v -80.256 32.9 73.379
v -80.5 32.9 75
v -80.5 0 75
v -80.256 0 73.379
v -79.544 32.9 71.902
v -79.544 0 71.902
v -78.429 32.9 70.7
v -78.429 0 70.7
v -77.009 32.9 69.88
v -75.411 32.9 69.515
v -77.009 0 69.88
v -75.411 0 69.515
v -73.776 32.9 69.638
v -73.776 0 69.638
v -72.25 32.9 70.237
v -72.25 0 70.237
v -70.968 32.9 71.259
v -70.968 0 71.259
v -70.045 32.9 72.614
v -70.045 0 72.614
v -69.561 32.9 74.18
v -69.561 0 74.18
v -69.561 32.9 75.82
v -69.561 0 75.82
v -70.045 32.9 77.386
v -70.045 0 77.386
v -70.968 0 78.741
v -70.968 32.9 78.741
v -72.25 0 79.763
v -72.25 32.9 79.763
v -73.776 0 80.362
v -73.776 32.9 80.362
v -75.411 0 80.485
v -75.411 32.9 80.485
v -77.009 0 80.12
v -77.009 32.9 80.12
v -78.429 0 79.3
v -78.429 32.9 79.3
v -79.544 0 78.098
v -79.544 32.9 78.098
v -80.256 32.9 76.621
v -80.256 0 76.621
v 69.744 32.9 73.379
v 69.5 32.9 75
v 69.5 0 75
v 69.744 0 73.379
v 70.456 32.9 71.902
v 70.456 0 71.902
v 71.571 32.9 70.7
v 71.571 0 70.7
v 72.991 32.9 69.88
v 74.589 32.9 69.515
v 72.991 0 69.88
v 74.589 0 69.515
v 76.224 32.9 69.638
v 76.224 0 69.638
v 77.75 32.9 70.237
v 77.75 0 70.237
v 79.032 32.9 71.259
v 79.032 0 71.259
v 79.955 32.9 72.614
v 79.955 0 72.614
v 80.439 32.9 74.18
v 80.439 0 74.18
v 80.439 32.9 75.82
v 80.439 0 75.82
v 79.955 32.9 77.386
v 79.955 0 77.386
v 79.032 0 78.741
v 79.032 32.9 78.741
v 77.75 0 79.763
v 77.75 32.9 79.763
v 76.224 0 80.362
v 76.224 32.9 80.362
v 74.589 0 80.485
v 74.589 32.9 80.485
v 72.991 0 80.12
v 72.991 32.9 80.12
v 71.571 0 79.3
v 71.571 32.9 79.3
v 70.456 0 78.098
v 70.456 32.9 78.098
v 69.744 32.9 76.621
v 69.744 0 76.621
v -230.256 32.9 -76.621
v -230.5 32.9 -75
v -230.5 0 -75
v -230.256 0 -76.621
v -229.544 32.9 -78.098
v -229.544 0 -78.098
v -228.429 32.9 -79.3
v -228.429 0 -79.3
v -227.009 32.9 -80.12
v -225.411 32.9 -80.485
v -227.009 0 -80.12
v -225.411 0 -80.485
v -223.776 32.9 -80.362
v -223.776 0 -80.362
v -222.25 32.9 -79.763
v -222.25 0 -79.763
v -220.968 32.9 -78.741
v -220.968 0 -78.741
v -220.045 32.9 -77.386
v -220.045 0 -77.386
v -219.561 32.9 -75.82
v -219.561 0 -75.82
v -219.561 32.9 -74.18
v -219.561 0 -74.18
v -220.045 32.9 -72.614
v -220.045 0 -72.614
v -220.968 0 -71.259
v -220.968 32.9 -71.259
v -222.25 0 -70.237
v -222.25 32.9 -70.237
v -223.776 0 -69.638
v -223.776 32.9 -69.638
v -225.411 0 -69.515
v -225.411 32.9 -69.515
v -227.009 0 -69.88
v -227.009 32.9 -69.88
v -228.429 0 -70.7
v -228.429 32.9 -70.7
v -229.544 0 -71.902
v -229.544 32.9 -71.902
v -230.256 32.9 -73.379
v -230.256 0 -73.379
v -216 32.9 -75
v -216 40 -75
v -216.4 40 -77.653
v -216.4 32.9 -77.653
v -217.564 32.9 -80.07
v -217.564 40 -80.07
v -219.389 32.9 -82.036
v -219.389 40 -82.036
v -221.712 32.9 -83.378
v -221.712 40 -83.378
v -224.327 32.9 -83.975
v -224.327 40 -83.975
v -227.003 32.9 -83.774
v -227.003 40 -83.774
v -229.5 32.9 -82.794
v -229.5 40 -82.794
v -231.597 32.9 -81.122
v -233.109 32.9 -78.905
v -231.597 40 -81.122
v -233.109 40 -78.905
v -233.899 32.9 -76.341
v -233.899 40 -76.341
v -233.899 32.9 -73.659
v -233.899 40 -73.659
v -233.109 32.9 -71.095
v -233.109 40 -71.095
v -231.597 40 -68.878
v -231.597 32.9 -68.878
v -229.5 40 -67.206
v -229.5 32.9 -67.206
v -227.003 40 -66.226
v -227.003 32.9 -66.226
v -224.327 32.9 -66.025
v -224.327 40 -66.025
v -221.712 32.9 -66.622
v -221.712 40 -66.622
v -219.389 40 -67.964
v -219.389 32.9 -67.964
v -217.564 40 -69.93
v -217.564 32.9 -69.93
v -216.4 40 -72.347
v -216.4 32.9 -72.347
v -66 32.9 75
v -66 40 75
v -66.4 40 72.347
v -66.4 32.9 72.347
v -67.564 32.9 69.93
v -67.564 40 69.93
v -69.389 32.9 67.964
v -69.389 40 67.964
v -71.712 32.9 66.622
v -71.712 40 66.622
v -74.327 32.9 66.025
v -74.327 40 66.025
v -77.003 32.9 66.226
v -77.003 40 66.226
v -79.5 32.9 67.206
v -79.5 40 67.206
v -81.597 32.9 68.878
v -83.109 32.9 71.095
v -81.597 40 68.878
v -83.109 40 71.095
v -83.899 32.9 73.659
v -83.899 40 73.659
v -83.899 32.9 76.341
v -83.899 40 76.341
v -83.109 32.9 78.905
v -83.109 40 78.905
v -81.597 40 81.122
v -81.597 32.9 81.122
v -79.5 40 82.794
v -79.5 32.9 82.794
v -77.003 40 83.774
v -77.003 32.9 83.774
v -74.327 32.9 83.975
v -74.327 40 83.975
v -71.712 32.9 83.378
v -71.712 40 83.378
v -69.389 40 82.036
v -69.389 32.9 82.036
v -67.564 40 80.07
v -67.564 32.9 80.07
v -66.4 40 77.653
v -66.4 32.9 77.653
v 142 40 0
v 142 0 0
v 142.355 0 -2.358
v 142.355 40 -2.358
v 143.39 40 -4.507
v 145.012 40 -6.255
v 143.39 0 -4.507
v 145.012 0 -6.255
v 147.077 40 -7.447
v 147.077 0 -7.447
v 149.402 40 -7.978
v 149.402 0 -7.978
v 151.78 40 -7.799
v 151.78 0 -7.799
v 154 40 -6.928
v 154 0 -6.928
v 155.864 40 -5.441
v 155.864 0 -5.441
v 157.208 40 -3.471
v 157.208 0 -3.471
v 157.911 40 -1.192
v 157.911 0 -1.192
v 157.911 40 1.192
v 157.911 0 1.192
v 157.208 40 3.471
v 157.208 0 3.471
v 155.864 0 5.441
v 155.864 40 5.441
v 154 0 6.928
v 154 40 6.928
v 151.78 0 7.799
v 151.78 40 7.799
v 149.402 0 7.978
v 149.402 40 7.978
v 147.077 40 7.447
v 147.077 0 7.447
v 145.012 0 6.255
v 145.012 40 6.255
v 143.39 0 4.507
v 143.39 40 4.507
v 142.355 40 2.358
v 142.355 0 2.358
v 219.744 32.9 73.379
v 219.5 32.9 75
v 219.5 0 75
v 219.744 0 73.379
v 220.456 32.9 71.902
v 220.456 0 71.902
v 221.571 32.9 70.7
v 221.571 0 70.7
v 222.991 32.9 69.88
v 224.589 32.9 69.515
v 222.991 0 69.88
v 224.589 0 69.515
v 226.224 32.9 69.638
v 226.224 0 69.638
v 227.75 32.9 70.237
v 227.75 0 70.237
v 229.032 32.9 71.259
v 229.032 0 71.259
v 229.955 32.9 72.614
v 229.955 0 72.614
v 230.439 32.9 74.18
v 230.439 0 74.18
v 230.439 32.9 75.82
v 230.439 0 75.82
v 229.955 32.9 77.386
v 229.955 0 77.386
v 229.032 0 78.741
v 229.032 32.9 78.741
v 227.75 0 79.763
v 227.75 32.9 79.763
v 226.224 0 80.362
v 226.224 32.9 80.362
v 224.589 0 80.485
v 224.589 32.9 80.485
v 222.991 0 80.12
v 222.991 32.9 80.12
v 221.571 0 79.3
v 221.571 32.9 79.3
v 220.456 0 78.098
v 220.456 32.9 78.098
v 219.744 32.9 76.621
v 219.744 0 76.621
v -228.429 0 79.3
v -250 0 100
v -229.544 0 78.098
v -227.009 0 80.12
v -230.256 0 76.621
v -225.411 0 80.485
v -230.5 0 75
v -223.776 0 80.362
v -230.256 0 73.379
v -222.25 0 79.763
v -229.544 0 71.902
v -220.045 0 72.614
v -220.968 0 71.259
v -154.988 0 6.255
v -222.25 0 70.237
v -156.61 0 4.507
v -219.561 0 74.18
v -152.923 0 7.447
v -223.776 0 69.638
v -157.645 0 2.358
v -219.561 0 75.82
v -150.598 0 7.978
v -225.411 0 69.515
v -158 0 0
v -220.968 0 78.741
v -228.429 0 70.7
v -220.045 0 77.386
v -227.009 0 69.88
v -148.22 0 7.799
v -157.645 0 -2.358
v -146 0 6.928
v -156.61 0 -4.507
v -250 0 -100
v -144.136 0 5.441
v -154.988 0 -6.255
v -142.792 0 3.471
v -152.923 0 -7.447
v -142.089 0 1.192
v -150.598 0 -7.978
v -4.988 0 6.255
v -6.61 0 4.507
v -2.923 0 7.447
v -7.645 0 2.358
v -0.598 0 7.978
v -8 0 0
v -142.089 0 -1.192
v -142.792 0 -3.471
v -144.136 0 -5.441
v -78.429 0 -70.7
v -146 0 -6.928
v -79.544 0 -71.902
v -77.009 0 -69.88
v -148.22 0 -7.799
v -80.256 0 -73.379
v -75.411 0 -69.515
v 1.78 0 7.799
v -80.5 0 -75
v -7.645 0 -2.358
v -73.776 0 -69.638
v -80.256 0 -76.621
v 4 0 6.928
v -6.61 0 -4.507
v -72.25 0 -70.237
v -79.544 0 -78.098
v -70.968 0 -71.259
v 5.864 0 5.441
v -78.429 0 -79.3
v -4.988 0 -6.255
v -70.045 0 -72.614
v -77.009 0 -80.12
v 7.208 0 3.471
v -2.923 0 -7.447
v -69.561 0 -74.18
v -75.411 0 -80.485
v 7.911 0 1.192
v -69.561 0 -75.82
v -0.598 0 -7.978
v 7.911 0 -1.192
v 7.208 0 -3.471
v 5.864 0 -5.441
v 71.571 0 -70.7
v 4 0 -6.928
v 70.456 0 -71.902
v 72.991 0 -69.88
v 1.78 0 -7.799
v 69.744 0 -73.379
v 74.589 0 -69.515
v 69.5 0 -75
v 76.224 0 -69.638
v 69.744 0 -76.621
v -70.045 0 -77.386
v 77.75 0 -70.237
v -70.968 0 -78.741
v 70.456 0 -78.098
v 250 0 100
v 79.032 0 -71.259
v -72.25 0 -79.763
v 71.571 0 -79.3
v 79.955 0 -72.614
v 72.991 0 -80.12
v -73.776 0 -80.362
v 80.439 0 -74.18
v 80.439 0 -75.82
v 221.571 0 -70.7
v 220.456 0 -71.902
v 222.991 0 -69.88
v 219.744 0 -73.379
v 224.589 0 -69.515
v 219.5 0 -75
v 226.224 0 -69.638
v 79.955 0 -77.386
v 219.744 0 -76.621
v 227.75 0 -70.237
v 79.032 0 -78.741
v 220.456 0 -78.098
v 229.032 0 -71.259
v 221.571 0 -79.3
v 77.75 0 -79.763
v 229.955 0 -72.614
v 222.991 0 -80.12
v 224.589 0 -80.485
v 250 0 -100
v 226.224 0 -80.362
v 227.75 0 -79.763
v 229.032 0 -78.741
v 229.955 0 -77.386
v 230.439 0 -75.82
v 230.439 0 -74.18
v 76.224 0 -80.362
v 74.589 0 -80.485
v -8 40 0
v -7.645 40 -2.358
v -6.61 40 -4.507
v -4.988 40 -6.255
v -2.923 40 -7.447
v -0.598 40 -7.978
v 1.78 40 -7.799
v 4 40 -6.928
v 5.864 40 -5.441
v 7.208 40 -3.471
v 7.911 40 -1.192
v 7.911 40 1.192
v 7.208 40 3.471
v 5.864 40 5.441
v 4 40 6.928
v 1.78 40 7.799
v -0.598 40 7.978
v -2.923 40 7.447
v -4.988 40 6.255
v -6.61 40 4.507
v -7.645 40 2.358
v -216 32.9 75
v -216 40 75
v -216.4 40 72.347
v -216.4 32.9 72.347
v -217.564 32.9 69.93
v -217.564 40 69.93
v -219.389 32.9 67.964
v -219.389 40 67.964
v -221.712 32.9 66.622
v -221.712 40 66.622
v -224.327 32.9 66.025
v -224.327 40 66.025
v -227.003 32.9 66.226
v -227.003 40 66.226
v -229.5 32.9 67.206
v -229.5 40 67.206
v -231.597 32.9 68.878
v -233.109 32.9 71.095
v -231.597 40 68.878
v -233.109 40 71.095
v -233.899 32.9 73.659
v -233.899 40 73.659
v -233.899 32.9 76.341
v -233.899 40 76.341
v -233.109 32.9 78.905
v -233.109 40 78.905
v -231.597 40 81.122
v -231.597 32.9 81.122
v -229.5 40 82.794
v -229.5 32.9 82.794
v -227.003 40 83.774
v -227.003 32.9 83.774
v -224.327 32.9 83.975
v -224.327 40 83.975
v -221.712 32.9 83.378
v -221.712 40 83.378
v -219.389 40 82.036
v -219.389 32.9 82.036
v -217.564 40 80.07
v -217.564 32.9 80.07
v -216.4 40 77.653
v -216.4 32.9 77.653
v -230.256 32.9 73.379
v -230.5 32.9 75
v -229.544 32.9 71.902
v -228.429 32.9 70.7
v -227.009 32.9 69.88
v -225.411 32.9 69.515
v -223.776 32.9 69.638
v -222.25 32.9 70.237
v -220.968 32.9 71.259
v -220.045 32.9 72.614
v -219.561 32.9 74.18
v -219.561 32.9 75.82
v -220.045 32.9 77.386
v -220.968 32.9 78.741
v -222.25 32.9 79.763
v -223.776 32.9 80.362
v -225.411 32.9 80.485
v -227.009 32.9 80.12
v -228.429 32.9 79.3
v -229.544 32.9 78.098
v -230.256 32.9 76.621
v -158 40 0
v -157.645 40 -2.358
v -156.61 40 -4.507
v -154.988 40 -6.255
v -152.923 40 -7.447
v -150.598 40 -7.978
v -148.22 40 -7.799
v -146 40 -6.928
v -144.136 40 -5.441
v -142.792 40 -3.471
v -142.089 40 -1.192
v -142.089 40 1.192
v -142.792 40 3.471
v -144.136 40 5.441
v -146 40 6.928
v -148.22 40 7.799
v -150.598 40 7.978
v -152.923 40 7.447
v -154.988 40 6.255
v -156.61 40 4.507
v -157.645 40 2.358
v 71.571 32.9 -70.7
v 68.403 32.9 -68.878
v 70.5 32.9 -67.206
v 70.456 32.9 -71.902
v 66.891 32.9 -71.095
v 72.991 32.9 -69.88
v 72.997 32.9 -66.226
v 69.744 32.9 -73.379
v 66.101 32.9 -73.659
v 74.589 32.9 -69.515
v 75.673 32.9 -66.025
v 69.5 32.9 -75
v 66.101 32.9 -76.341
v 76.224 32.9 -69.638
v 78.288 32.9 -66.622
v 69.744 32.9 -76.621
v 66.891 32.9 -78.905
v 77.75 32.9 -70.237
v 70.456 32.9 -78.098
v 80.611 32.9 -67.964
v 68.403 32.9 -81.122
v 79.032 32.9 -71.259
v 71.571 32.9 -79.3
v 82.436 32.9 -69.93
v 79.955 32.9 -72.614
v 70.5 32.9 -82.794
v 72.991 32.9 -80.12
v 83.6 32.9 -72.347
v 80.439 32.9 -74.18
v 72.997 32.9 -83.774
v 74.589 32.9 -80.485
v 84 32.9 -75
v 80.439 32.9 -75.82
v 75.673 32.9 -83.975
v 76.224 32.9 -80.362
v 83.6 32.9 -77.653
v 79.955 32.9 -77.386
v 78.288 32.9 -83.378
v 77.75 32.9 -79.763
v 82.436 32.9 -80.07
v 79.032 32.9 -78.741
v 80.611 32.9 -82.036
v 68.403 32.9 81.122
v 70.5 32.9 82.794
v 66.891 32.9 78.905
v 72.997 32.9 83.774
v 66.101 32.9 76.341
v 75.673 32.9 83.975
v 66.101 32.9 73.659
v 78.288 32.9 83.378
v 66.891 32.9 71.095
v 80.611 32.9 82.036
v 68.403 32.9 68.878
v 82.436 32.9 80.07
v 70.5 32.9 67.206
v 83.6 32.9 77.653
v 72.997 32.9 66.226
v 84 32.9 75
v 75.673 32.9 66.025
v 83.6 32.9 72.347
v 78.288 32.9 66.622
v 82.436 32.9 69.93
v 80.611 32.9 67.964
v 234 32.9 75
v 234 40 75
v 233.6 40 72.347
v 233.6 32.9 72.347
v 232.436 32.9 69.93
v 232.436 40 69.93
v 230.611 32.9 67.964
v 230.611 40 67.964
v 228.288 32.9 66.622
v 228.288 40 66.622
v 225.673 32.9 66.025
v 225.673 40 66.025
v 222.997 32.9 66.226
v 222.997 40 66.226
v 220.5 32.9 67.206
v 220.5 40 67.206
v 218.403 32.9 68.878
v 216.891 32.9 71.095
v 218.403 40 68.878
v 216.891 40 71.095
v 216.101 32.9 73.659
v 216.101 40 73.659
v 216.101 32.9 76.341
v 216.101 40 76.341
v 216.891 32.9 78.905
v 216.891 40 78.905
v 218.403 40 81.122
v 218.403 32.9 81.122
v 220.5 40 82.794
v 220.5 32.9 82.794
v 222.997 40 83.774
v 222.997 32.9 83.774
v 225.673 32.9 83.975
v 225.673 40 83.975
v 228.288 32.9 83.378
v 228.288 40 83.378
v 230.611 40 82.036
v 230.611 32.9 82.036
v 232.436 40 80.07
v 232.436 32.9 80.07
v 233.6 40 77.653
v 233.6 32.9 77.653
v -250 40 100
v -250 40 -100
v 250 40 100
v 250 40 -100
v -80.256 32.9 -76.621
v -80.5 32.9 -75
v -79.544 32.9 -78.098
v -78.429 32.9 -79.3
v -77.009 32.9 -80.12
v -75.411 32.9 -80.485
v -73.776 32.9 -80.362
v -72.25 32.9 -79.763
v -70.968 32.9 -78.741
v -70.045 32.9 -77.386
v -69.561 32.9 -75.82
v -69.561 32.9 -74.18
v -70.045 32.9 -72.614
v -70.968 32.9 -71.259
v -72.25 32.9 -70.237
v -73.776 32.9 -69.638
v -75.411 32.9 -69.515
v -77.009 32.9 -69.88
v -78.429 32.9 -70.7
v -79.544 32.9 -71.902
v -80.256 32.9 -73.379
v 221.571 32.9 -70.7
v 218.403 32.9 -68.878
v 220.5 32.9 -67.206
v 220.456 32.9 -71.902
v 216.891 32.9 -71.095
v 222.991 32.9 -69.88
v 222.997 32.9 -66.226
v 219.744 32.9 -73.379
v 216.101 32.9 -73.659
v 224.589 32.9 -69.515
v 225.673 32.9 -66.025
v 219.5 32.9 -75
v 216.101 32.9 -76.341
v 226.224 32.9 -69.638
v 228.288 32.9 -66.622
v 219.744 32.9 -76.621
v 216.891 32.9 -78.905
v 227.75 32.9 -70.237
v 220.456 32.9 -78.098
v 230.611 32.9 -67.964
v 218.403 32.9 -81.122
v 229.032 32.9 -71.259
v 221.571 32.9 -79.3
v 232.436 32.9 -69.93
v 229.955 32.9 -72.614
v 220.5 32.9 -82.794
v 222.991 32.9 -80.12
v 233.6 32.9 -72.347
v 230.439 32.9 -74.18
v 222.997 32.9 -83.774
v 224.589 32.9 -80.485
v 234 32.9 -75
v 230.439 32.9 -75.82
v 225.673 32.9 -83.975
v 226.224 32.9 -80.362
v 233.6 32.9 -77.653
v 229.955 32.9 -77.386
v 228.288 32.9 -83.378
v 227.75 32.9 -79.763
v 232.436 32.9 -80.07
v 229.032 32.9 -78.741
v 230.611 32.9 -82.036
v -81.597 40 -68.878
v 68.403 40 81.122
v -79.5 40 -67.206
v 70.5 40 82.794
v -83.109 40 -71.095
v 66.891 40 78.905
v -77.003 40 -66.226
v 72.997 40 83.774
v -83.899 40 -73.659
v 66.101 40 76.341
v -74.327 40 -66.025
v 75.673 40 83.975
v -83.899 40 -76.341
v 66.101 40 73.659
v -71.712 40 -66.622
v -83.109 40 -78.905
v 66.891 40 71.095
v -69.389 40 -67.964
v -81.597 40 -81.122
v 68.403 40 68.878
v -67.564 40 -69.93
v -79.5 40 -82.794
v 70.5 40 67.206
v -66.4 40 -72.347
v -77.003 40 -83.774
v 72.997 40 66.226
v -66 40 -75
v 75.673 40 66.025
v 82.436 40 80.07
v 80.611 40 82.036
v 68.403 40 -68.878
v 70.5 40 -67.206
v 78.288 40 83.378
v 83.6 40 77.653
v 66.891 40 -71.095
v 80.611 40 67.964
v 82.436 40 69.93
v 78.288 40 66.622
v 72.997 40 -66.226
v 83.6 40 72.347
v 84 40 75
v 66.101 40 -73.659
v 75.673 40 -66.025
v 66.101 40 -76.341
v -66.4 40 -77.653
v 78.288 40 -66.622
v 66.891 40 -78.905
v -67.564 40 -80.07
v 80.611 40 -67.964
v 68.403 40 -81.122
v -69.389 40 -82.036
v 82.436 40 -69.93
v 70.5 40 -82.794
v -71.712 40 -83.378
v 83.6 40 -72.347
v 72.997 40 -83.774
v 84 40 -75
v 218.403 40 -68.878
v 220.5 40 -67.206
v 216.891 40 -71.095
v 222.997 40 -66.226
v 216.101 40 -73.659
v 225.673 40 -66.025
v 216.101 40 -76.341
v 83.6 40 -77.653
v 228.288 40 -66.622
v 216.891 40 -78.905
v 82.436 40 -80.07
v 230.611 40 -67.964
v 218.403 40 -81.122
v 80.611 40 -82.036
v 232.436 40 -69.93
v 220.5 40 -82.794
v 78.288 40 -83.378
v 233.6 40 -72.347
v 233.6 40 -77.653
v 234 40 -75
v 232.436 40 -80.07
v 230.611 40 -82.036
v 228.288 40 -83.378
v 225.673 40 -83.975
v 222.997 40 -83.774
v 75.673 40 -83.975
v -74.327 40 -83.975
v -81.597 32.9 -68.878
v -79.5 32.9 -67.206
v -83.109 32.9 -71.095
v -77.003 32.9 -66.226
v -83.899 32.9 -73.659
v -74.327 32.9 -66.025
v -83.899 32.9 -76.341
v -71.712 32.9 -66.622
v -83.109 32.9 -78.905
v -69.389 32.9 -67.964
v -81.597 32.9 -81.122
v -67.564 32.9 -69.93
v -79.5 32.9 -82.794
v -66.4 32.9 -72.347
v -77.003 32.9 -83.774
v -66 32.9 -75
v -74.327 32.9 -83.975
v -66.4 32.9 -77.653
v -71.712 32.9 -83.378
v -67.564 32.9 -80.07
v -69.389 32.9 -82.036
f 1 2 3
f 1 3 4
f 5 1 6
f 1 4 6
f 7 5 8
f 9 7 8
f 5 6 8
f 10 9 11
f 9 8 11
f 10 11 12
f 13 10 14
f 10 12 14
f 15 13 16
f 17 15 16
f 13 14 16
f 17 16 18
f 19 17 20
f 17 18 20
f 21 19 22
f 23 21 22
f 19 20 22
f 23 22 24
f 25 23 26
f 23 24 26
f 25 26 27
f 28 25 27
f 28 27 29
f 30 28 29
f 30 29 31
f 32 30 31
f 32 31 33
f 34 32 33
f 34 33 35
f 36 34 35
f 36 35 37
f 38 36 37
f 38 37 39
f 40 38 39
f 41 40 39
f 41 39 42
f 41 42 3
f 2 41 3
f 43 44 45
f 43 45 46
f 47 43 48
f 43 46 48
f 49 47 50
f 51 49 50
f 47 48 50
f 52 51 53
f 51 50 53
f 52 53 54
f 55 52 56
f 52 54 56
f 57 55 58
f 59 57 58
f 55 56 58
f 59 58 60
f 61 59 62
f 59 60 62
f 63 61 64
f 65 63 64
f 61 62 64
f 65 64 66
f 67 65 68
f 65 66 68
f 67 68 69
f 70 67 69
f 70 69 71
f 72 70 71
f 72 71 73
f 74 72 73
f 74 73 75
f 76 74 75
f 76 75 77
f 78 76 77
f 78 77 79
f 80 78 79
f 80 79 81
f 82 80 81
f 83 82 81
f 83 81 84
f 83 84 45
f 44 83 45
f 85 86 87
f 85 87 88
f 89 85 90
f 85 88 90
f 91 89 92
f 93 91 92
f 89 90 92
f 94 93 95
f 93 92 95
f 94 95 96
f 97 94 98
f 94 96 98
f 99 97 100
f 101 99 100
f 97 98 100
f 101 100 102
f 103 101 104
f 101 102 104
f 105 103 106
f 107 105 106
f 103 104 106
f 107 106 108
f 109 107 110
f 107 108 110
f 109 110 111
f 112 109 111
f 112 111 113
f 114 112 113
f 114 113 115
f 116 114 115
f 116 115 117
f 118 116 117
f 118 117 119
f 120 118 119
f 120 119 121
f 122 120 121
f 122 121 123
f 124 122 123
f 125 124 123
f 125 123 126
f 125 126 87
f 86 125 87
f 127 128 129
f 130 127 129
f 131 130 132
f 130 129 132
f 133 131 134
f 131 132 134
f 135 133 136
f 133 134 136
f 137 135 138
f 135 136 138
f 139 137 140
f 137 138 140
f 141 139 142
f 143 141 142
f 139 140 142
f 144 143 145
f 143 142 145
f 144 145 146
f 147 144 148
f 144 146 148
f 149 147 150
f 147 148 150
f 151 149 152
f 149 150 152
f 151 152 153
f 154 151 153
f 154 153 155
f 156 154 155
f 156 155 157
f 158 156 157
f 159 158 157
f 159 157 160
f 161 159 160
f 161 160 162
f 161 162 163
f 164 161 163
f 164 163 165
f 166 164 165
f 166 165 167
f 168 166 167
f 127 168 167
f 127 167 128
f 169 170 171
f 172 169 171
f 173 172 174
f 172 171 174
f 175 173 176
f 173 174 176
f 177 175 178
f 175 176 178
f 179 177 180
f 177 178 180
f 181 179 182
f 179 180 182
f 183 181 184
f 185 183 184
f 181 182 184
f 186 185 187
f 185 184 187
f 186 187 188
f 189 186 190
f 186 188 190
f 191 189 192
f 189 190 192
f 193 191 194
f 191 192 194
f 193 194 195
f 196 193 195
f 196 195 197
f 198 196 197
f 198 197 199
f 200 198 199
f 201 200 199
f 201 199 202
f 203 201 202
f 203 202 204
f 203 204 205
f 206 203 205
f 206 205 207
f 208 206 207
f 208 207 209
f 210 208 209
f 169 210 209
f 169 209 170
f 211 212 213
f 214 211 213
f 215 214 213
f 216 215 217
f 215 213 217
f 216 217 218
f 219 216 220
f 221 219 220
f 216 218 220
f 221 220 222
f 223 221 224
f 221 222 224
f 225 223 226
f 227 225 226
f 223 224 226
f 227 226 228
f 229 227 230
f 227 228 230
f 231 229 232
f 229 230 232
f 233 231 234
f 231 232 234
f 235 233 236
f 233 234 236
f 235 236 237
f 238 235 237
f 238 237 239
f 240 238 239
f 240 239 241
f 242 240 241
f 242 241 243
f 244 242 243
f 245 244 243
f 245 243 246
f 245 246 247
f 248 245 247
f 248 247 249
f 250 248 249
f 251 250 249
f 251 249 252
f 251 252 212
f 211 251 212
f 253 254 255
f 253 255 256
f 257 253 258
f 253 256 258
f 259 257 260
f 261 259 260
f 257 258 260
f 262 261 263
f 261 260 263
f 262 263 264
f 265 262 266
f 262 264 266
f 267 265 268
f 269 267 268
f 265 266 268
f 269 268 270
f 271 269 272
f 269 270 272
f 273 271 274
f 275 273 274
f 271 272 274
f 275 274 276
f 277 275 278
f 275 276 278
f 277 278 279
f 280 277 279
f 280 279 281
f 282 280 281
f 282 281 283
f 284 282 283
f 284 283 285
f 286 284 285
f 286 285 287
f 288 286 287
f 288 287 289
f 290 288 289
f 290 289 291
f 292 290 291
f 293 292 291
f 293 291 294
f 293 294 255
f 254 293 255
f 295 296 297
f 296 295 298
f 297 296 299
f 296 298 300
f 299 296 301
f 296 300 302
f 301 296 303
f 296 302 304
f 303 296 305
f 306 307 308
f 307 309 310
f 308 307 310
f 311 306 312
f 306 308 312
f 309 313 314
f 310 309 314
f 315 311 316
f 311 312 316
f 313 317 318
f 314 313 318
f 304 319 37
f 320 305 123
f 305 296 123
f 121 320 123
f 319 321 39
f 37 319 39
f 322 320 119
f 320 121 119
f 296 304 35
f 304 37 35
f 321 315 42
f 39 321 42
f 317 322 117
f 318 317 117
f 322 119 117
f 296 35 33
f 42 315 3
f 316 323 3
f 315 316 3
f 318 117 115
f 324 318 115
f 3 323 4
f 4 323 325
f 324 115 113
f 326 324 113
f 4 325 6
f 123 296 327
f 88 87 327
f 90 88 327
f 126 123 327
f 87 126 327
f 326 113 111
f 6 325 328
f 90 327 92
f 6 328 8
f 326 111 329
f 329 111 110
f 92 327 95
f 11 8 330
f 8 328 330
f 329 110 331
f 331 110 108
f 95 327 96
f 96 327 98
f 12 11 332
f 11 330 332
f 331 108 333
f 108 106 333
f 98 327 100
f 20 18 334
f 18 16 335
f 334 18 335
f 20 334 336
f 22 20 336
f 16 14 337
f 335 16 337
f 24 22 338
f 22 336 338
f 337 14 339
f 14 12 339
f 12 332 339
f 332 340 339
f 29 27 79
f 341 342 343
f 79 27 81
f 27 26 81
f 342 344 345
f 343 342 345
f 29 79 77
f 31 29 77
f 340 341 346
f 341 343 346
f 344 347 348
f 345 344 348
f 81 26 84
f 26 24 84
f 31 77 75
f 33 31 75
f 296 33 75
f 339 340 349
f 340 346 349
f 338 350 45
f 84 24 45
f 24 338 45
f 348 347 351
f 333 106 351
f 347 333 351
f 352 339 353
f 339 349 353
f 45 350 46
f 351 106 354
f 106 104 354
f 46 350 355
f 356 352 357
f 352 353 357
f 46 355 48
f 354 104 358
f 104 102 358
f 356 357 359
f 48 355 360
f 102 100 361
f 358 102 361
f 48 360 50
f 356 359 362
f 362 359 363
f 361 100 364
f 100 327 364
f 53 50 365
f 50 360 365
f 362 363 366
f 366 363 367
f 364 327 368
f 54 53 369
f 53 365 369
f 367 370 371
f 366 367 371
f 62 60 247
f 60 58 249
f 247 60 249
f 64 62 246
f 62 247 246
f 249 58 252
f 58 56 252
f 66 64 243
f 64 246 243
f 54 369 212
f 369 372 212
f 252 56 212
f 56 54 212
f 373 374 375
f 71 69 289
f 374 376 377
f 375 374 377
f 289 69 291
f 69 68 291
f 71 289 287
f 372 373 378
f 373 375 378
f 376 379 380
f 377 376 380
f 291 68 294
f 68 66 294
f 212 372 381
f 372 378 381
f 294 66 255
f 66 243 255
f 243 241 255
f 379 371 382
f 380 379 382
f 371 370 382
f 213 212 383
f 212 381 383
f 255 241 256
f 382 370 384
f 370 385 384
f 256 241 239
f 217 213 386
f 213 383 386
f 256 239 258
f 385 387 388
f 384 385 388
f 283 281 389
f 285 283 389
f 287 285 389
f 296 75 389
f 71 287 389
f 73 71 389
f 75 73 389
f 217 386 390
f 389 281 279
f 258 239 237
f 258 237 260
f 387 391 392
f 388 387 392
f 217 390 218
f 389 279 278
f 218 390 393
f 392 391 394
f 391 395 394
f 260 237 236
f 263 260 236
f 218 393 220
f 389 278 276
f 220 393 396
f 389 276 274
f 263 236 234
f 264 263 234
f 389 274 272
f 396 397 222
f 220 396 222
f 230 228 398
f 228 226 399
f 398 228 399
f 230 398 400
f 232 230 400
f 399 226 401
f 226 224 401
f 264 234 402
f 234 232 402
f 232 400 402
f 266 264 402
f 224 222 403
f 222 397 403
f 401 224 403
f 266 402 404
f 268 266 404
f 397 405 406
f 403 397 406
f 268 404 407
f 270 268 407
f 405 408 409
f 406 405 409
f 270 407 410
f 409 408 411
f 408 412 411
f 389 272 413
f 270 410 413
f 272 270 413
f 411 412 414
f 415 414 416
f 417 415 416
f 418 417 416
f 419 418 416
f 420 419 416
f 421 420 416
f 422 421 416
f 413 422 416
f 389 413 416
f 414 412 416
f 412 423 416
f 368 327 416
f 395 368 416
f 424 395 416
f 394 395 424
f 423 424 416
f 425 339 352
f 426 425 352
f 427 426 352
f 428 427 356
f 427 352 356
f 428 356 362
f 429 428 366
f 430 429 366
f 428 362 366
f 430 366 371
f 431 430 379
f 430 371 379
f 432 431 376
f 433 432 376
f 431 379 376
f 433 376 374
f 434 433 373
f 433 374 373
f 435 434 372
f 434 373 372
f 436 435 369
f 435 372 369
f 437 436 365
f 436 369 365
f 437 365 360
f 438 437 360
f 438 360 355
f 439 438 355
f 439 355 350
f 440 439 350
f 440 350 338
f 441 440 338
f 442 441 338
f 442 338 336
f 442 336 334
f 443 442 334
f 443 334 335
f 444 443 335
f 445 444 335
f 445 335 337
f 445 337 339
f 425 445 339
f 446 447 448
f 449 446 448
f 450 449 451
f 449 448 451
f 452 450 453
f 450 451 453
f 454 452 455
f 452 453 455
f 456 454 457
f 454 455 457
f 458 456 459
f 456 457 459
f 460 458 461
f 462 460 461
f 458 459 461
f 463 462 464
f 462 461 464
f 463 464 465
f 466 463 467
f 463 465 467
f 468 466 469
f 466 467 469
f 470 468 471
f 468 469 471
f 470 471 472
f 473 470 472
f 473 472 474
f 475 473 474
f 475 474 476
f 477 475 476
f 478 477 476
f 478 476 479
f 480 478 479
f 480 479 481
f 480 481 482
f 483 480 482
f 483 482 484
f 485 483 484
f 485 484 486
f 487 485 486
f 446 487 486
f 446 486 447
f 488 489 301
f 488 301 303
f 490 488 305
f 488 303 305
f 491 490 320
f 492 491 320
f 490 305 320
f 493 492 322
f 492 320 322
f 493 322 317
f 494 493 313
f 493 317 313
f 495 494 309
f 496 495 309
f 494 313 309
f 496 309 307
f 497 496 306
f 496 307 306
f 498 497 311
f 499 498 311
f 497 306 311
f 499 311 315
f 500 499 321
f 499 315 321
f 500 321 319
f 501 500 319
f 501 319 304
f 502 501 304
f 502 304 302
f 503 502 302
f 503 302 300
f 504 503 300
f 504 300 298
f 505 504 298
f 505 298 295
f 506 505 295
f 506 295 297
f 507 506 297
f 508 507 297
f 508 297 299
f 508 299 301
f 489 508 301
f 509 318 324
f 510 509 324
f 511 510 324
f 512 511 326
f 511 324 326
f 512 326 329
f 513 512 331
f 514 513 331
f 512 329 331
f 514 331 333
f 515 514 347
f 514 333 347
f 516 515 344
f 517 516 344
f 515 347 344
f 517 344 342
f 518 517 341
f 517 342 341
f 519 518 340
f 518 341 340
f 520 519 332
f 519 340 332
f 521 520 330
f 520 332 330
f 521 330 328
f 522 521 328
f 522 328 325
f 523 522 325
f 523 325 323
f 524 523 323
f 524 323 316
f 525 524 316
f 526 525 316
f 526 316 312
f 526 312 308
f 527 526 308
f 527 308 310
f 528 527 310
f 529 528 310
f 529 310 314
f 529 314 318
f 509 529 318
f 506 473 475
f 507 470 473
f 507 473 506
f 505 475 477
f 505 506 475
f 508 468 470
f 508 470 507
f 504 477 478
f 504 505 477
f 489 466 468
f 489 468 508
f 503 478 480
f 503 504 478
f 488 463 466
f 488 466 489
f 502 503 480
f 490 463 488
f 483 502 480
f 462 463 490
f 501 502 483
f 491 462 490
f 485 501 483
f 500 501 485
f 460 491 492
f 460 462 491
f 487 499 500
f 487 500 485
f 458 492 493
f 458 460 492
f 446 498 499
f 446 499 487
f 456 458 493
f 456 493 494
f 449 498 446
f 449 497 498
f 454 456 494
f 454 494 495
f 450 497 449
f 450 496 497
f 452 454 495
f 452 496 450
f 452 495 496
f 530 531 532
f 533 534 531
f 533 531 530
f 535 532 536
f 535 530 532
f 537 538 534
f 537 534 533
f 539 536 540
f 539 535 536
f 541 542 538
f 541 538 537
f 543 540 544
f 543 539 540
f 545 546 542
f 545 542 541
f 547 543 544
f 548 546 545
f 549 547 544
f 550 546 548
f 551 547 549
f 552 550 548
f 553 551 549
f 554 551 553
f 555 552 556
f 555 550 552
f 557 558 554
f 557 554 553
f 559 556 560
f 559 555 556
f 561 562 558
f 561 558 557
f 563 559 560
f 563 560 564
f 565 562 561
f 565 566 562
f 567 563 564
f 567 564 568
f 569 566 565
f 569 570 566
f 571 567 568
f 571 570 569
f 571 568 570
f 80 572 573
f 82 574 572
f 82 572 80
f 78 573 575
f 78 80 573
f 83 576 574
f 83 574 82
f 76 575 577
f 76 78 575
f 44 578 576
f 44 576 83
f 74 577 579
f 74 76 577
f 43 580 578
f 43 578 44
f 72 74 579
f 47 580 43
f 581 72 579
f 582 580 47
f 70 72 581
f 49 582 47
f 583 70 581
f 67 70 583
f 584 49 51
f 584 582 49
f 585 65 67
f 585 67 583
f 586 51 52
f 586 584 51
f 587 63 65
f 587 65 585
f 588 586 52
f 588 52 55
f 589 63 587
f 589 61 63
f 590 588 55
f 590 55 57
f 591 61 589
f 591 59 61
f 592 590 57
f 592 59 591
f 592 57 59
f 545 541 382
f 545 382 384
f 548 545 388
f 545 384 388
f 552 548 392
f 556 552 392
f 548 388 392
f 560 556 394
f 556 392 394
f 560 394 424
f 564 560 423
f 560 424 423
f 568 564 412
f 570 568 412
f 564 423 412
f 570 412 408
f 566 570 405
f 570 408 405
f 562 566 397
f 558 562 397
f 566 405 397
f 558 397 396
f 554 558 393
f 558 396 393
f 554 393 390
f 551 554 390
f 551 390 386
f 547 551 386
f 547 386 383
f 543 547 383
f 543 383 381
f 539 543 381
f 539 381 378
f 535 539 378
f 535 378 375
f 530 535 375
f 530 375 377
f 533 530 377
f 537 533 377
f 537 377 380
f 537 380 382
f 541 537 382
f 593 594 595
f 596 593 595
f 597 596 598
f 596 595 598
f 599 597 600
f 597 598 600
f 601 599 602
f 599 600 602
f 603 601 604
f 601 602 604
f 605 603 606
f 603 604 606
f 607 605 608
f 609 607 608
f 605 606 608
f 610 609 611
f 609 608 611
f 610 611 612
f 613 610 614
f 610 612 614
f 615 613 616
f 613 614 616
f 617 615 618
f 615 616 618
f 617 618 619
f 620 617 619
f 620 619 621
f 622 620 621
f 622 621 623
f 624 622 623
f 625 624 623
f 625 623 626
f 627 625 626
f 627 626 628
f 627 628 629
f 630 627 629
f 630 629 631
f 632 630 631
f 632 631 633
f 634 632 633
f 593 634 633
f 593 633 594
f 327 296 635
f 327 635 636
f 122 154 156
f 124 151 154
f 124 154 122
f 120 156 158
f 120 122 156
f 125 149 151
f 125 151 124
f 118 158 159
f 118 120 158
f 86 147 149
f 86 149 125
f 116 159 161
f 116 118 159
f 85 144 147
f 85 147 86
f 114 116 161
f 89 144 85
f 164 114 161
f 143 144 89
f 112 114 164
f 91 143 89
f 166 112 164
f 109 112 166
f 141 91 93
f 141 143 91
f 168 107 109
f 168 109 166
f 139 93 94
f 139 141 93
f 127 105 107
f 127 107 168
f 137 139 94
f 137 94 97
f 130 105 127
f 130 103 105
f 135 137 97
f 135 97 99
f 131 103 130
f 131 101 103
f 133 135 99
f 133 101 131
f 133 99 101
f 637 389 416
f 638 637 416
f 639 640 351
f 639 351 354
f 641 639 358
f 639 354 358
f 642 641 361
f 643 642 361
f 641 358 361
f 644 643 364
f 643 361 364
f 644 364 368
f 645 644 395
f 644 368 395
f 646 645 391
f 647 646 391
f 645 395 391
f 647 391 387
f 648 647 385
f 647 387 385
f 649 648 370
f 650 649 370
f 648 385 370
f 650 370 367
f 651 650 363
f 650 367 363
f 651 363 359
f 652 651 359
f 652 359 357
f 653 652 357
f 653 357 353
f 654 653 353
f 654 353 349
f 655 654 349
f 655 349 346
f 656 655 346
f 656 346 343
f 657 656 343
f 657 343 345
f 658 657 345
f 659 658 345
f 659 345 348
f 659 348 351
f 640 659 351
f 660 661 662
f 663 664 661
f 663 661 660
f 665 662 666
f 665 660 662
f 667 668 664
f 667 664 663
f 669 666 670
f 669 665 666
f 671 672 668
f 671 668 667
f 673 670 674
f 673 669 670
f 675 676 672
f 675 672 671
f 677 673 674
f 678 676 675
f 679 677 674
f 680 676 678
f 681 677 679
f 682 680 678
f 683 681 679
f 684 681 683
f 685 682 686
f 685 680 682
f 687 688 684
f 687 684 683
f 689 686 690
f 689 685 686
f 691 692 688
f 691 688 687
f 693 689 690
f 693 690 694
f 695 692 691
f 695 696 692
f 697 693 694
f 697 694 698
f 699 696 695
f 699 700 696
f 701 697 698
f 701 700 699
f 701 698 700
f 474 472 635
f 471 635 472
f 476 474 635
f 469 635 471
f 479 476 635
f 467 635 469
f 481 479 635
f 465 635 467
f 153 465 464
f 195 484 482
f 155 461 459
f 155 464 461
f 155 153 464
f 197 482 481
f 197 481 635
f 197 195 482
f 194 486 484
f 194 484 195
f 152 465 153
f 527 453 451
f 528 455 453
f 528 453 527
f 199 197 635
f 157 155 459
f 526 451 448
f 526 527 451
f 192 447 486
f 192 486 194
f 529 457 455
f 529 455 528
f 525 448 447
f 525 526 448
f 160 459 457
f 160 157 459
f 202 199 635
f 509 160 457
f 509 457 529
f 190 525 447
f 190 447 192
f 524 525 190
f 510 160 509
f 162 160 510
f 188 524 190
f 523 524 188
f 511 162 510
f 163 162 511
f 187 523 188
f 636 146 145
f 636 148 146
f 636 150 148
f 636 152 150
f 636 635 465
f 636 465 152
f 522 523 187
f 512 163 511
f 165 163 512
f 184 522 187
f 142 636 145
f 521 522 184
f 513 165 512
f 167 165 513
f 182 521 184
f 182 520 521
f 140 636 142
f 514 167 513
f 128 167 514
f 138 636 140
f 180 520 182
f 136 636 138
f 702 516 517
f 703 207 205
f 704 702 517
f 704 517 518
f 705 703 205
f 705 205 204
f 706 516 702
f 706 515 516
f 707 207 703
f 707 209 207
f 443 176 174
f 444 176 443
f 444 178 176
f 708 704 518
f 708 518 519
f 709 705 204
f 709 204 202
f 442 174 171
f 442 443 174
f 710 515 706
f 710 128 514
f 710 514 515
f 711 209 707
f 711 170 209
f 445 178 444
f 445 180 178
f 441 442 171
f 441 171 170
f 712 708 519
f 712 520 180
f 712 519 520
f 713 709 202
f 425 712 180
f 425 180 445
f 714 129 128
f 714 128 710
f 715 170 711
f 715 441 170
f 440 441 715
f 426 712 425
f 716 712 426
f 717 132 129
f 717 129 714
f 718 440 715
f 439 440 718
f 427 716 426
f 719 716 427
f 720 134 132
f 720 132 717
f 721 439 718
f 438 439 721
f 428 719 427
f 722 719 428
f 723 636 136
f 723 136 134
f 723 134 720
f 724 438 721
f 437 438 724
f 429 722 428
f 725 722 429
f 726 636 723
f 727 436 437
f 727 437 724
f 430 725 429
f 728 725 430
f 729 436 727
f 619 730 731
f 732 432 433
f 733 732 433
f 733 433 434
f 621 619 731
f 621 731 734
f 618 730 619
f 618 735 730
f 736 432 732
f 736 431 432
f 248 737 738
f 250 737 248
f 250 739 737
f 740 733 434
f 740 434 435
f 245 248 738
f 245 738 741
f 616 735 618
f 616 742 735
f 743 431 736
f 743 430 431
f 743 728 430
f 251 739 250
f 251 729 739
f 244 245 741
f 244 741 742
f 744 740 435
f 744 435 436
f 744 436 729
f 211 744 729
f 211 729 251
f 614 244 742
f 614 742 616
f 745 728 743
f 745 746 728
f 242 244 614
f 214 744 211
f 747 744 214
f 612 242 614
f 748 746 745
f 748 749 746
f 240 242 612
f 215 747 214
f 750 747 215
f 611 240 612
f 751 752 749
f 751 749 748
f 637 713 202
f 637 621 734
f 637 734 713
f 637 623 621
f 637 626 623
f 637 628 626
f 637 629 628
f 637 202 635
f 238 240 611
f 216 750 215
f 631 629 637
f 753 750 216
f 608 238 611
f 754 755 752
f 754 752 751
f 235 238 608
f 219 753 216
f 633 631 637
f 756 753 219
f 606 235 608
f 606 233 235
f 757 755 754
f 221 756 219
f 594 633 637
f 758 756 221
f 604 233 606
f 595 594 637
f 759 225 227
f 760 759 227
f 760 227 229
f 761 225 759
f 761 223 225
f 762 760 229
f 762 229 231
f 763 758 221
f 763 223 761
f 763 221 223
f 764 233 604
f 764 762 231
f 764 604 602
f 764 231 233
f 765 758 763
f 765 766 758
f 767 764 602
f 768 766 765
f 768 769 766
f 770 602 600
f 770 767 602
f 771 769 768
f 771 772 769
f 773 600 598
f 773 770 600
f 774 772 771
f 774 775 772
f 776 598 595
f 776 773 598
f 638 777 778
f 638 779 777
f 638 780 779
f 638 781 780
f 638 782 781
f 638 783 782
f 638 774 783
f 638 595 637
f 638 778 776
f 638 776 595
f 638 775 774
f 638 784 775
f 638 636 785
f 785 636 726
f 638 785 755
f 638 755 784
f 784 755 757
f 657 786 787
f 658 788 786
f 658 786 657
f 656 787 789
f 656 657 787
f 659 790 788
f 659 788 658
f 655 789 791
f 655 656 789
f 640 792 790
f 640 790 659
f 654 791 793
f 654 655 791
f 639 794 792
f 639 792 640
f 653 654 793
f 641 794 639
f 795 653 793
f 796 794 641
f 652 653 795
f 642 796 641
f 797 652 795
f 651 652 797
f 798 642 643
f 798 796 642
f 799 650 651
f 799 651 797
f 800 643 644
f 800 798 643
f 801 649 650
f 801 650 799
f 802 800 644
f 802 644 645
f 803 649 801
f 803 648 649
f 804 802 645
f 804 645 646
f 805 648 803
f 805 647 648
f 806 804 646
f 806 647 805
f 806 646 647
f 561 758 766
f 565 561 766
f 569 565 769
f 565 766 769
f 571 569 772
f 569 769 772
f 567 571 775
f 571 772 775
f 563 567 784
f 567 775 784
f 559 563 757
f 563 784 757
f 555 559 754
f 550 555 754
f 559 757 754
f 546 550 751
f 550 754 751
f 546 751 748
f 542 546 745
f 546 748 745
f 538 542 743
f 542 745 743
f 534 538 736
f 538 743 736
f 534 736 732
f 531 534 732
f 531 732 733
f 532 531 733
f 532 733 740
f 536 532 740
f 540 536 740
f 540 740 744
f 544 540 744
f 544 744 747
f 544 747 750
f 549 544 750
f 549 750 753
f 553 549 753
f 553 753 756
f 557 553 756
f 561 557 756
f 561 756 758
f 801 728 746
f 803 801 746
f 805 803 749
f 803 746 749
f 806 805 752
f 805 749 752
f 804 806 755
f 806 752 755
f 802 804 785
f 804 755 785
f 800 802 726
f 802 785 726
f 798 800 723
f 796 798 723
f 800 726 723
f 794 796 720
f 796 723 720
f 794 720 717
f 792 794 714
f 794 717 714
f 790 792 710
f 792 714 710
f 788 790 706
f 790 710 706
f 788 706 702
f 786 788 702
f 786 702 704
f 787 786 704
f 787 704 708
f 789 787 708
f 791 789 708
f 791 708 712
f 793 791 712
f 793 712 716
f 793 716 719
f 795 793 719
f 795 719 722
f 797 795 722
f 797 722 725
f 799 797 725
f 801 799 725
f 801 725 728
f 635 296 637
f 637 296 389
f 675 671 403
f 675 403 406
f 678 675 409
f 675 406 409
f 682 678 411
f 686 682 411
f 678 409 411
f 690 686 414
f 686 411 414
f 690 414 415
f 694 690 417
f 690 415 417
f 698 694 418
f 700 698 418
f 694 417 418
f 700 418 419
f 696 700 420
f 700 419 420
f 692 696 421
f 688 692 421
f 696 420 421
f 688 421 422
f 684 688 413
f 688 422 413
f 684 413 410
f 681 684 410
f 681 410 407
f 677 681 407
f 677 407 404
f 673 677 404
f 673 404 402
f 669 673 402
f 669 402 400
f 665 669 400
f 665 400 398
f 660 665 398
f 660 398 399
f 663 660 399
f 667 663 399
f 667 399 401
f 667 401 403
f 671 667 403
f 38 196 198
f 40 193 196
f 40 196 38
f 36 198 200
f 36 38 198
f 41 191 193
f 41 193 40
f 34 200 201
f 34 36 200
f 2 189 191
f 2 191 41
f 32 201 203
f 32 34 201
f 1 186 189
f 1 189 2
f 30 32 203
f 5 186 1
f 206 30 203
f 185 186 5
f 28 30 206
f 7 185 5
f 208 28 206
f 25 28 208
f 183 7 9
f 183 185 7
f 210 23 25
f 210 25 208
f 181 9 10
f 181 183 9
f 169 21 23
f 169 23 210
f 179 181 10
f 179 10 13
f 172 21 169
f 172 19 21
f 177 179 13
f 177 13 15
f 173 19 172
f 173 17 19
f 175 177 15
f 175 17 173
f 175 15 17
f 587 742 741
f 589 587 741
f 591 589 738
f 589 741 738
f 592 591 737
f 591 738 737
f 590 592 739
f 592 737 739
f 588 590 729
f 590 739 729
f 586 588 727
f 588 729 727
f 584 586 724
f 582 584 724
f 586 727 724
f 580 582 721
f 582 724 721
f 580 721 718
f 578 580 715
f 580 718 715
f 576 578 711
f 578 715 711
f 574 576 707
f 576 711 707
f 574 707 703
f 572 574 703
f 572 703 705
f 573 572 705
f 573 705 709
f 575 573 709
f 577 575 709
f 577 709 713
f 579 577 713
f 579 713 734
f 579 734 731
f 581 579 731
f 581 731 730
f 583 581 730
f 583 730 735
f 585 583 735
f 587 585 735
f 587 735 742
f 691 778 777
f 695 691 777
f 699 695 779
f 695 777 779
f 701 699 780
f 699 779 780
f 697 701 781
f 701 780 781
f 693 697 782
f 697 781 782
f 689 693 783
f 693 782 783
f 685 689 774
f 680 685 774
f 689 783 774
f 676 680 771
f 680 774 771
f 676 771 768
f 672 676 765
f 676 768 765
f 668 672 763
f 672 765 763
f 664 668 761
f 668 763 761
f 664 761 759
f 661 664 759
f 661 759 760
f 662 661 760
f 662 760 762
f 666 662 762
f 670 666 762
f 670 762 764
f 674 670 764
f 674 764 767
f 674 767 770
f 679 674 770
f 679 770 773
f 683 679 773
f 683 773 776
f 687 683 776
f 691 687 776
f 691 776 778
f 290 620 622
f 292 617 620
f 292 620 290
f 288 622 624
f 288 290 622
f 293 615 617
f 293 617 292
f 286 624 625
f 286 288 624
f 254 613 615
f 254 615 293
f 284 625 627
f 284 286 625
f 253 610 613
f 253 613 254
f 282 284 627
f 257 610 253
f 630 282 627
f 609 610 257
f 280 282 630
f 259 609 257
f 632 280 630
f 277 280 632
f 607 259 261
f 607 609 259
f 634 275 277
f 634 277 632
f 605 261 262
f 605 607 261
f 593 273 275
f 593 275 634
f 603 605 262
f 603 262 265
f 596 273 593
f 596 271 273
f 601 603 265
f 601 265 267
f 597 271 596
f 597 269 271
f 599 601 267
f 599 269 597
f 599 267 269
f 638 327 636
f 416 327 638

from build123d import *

# Parameters (mm, degrees)
ESBO_O1_W                                            = 500
ESBO_O1_H                                            = 200
RESSALTO_EXTRUS_O1_DEPTH                             = 40
REBAIXO_PARA_PARAFUSO_ALLEN_SEXTAVADO_DE_D           = 11
REBAIXO_PARA_PARAFUSO_ALLEN_SEXTAVADO_DE_DEPTH       = 40
REBAIXO_PARA_PARAFUSO_ALLEN_SEXTAVADO_DE_CBORE_D     = 18
REBAIXO_PARA_PARAFUSO_ALLEN_SEXTAVADO_DE_CBORE_DEPTH = 7.1
FURO_ROSCADO_DE_M18X2_0_D                            = 16
FURO_ROSCADO_DE_M18X2_0_DEPTH                        = 40


with BuildPart() as part:
    # Esboço1 → Ressalto-extrusão1 (new body)
    with BuildSketch(Plane(origin=(0, 0, 0), x_dir=(1, 0, 0), z_dir=(0, 1, 0))):
        Rectangle(ESBO_O1_W, ESBO_O1_H)
    extrude(amount=RESSALTO_EXTRUS_O1_DEPTH)

    # Rebaixo para parafuso Allen sextavado de M101
    with Locations(Plane(origin=(0, 40, 0), x_dir=(1, 0, 0), z_dir=(0, 1, 0))):
        with Locations((-225, 75), (-75, 75), (75, 75), (-75, -75), (75, -75), (-225, -75), (225, 75), (225, -75)):
            CounterBoreHole(REBAIXO_PARA_PARAFUSO_ALLEN_SEXTAVADO_DE_D / 2, REBAIXO_PARA_PARAFUSO_ALLEN_SEXTAVADO_DE_CBORE_D / 2, REBAIXO_PARA_PARAFUSO_ALLEN_SEXTAVADO_DE_CBORE_DEPTH, depth=REBAIXO_PARA_PARAFUSO_ALLEN_SEXTAVADO_DE_DEPTH)

    # Furo roscado de M18x2.0
    with Locations(Plane(origin=(0, 40, 0), x_dir=(1, 0, 0), z_dir=(0, 1, 0))):
        with Locations((-150, 0), (0, 0), (150, 0)):
            Hole(FURO_ROSCADO_DE_M18X2_0_D / 2, depth=FURO_ROSCADO_DE_M18X2_0_DEPTH)


solid = part.part
